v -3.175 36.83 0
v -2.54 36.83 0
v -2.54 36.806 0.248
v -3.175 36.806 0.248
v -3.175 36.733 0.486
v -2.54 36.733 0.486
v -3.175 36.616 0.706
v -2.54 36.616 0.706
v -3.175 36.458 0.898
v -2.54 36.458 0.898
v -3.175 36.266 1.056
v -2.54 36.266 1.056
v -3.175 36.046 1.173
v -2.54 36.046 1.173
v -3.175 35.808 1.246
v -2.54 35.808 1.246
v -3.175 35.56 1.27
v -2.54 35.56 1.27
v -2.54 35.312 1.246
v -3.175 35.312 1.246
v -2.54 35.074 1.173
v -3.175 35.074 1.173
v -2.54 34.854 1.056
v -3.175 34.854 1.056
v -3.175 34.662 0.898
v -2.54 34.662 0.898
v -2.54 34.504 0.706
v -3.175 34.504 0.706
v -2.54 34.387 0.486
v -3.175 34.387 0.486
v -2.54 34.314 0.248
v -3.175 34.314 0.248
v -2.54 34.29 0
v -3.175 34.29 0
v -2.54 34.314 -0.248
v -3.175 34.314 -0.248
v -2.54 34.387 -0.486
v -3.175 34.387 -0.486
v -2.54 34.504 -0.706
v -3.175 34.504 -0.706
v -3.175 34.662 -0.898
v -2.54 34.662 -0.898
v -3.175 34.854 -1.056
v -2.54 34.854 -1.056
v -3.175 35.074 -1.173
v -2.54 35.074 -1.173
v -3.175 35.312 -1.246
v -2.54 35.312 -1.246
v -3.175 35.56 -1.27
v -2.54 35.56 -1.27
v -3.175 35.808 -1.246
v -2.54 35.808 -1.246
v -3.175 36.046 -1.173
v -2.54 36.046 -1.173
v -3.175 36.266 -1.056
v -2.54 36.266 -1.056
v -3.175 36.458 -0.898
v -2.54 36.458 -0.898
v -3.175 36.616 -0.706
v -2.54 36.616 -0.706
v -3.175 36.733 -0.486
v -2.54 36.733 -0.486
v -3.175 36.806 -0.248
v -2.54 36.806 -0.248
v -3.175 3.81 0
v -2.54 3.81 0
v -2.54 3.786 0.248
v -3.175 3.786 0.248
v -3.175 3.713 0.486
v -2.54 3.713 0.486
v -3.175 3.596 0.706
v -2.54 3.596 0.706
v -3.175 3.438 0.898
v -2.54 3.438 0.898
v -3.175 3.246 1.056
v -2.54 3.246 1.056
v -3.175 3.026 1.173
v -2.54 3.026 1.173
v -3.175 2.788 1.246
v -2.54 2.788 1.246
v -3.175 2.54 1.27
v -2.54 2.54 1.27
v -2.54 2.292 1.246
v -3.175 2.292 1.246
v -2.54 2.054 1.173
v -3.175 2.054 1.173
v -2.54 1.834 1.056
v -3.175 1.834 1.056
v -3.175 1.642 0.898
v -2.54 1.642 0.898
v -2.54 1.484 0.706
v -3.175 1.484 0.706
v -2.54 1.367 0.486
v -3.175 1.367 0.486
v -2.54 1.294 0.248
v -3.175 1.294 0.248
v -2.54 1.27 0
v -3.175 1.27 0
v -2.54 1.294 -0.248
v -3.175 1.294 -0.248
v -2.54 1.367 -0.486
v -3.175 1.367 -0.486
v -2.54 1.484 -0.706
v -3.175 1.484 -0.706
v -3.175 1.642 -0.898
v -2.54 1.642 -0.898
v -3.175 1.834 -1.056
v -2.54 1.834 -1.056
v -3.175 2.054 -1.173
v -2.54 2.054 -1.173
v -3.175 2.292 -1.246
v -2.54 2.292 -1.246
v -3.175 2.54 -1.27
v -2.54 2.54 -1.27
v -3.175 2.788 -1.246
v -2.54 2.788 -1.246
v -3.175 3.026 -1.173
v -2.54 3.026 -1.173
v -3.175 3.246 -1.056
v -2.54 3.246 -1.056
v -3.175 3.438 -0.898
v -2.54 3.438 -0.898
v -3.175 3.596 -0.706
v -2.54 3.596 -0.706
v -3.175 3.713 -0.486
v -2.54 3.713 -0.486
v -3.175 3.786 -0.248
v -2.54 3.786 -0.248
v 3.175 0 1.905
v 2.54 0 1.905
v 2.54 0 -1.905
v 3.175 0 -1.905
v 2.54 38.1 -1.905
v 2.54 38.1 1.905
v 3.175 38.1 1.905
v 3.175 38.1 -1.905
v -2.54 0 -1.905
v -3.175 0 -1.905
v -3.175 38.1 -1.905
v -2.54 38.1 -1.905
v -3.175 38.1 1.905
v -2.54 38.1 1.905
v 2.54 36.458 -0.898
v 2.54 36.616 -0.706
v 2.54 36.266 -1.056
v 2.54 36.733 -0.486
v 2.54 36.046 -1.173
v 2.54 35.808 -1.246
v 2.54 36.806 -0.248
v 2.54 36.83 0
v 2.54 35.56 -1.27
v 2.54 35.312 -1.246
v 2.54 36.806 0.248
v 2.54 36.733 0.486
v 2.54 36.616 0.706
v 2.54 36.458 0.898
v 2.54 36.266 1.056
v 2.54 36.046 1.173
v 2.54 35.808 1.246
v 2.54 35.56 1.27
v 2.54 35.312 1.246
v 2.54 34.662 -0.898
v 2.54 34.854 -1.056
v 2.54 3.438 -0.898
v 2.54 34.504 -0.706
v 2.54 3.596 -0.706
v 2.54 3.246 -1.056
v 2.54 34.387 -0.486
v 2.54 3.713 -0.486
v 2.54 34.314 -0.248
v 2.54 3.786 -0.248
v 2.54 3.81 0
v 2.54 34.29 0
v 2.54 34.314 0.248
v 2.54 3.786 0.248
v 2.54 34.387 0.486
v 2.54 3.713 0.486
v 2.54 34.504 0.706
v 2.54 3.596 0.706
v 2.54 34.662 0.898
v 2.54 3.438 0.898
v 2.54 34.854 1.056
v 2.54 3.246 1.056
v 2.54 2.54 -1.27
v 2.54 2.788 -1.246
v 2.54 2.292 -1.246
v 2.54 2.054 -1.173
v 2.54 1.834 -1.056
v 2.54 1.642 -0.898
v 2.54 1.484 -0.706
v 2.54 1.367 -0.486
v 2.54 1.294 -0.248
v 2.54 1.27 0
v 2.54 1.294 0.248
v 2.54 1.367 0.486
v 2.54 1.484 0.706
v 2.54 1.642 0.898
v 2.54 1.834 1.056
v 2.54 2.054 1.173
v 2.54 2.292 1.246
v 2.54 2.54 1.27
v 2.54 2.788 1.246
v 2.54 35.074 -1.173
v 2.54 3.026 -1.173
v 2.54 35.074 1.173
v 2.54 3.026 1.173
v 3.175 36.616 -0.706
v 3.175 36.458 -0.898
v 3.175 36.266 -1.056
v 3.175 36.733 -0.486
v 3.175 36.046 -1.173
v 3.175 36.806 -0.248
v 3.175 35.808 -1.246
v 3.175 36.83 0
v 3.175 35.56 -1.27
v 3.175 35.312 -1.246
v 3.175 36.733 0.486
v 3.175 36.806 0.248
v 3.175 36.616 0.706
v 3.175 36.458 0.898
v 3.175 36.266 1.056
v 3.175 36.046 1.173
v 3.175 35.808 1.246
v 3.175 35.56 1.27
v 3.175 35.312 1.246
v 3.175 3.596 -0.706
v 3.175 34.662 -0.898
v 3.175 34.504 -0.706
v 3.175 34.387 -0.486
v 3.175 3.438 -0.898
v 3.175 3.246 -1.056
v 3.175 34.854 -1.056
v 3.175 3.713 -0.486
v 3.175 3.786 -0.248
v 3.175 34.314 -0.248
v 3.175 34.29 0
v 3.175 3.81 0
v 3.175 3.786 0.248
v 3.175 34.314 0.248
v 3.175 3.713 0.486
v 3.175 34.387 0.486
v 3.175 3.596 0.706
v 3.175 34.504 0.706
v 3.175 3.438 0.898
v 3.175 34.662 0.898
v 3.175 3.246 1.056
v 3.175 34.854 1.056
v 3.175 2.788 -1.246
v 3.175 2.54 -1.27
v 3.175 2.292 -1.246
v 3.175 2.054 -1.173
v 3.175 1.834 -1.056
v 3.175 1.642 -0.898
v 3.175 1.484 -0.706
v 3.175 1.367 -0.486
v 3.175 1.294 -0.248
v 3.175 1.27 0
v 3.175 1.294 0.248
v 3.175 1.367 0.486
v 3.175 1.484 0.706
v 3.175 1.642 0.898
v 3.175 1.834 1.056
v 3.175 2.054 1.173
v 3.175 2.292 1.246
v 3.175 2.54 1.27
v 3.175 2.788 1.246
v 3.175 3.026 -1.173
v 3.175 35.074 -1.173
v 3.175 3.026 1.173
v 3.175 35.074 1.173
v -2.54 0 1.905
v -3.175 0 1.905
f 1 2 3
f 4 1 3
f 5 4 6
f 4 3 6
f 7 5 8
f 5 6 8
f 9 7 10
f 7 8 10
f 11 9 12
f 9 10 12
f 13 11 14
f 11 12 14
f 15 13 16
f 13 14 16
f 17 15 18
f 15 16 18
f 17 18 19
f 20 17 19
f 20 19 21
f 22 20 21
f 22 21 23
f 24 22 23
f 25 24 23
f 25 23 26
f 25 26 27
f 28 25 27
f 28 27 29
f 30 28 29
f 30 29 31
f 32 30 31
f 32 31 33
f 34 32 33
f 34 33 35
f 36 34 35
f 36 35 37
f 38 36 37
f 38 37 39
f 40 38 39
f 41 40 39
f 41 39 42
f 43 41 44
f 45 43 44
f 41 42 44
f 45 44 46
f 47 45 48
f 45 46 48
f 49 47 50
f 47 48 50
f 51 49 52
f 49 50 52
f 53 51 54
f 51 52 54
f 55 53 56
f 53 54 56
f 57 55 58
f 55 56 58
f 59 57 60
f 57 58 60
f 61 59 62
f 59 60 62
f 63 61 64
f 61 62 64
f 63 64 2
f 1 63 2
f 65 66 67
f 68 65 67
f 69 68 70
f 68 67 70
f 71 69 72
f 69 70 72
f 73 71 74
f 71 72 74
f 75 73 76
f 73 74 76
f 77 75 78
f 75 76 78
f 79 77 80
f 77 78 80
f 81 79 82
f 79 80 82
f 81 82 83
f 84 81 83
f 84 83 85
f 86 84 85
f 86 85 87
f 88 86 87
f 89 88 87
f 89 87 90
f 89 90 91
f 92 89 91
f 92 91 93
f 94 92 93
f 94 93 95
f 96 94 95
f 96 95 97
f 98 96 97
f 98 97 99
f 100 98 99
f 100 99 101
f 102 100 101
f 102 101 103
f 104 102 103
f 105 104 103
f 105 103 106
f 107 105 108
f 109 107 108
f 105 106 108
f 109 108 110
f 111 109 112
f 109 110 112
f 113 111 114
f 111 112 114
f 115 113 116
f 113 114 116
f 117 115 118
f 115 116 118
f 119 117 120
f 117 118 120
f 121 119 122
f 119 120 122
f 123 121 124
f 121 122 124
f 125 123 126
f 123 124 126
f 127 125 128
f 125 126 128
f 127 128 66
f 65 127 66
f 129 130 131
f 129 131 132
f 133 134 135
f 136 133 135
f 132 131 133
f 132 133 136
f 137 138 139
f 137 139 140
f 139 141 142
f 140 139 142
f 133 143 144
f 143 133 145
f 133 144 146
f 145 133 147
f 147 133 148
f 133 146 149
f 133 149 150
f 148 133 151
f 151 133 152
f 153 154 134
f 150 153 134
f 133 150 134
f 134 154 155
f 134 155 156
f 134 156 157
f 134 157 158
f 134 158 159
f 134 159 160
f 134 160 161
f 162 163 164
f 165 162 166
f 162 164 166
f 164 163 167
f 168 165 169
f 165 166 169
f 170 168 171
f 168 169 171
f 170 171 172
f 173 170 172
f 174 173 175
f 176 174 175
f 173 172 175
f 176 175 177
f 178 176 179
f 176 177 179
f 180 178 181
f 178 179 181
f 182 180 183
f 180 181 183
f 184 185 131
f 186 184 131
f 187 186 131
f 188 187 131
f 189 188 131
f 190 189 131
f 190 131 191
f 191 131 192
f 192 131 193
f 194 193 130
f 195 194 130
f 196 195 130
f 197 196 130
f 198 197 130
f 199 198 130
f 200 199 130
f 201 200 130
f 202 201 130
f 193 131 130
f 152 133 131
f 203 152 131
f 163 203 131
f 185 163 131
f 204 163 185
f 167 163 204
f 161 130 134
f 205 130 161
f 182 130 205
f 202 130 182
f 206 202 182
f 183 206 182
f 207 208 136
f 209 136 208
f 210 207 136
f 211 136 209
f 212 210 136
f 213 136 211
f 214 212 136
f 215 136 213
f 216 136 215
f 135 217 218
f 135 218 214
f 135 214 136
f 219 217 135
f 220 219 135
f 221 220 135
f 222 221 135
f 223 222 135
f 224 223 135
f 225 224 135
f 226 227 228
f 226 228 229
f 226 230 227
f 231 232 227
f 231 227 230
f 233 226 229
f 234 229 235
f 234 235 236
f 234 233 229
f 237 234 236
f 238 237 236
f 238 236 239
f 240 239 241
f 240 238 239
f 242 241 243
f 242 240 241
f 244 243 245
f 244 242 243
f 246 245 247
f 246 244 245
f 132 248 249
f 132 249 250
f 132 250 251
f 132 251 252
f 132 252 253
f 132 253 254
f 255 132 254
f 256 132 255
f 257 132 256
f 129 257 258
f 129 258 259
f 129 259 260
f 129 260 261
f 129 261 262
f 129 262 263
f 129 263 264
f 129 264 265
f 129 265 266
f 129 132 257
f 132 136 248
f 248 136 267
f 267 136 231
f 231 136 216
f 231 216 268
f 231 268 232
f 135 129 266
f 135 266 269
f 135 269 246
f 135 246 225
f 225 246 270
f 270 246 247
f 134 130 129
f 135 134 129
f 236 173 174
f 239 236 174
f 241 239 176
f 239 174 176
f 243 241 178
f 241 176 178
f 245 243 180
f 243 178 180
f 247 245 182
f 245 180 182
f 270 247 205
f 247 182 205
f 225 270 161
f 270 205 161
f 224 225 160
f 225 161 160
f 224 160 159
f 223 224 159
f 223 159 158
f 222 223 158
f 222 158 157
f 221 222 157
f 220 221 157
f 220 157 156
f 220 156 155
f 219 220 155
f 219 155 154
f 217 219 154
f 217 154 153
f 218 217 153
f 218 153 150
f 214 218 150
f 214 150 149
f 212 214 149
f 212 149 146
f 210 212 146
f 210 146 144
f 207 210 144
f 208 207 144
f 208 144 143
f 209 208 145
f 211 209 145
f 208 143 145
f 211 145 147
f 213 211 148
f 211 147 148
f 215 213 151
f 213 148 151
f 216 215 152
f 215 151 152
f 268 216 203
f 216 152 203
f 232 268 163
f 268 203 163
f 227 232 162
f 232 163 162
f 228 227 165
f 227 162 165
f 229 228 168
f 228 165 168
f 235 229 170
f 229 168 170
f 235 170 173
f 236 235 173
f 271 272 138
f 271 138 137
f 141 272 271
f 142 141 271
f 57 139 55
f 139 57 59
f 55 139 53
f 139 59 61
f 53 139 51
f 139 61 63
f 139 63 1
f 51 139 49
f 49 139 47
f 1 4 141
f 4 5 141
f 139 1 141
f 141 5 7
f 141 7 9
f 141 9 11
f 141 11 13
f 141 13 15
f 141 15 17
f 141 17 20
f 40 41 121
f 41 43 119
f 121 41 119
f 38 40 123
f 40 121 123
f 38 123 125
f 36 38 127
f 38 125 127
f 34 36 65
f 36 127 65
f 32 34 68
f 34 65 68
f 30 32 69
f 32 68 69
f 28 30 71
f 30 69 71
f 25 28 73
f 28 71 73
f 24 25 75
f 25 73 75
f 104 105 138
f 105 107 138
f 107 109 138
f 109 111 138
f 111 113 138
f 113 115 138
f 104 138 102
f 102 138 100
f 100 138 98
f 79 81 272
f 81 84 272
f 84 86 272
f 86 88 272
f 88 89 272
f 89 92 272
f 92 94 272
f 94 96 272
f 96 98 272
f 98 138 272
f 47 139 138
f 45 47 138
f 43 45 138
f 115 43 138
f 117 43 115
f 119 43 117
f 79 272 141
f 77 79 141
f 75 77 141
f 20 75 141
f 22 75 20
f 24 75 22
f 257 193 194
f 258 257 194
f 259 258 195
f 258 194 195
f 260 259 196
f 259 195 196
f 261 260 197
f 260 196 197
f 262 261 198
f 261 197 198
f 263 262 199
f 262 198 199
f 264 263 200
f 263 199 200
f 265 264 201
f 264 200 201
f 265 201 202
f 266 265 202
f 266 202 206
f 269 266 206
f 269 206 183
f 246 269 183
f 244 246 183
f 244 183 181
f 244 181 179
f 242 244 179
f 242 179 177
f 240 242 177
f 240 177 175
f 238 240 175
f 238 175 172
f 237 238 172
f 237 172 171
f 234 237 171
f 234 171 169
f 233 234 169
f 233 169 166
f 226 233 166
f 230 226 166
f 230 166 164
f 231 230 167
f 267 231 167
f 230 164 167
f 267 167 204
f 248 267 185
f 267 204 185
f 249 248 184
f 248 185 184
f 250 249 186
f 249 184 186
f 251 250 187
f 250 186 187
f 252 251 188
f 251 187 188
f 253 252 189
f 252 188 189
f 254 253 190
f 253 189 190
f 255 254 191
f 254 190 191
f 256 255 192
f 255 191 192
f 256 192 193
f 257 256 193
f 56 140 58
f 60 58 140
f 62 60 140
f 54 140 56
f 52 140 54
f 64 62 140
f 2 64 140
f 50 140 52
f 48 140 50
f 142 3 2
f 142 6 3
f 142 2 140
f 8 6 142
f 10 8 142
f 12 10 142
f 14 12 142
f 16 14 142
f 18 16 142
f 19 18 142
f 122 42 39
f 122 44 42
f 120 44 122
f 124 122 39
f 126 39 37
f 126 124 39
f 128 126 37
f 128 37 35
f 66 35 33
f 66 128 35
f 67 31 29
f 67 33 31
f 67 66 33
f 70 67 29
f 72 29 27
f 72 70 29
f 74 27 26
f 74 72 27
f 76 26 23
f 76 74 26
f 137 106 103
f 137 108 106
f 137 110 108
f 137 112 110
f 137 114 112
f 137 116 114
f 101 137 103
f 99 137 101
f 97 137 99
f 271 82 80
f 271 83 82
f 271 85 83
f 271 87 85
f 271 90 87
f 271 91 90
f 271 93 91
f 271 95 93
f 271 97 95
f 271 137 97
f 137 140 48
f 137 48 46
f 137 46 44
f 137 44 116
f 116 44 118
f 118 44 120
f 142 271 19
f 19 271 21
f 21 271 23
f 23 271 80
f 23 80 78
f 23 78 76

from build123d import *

# Parameters (mm, degrees)
F0_W     = 0.635
F0_H     = 3.81
F1_DEPTH = 38.1
F2_R     = 1.27
F3_DEPTH = 11.684
F4_R     = 1.27
F5_DEPTH = 25.4


with BuildPart() as f1:
    # F0 (on Front) → F1 (new body)
    with BuildSketch(Plane.XZ):
        with Locations((-2.8575, 0)):
            Rectangle(F0_W, F0_H)
        with Locations((2.8575, 0)):
            Rectangle(F0_W, F0_H)
    extrude(amount=-F1_DEPTH)

    # F2 (on face) → F3 (cut)
    with BuildSketch(Plane(origin=(2.54, 0, 0), x_dir=(0, -1, 0), z_dir=(-1, 0, 0))):
        with Locations((-2.54, 0)):
            Circle(F2_R)
        with Locations((-35.56, 0)):
            Circle(F2_R)
    extrude(amount=-F3_DEPTH, mode=Mode.SUBTRACT)

    # F4 (on face) → F5 (cut)
    with BuildSketch(Plane.YZ.offset(-2.54)):
        with Locations((2.54, 0)):
            Circle(F4_R)
        with Locations((35.56, 0)):
            Circle(F4_R)
    extrude(amount=-F5_DEPTH, mode=Mode.SUBTRACT)


solid = f1.part
